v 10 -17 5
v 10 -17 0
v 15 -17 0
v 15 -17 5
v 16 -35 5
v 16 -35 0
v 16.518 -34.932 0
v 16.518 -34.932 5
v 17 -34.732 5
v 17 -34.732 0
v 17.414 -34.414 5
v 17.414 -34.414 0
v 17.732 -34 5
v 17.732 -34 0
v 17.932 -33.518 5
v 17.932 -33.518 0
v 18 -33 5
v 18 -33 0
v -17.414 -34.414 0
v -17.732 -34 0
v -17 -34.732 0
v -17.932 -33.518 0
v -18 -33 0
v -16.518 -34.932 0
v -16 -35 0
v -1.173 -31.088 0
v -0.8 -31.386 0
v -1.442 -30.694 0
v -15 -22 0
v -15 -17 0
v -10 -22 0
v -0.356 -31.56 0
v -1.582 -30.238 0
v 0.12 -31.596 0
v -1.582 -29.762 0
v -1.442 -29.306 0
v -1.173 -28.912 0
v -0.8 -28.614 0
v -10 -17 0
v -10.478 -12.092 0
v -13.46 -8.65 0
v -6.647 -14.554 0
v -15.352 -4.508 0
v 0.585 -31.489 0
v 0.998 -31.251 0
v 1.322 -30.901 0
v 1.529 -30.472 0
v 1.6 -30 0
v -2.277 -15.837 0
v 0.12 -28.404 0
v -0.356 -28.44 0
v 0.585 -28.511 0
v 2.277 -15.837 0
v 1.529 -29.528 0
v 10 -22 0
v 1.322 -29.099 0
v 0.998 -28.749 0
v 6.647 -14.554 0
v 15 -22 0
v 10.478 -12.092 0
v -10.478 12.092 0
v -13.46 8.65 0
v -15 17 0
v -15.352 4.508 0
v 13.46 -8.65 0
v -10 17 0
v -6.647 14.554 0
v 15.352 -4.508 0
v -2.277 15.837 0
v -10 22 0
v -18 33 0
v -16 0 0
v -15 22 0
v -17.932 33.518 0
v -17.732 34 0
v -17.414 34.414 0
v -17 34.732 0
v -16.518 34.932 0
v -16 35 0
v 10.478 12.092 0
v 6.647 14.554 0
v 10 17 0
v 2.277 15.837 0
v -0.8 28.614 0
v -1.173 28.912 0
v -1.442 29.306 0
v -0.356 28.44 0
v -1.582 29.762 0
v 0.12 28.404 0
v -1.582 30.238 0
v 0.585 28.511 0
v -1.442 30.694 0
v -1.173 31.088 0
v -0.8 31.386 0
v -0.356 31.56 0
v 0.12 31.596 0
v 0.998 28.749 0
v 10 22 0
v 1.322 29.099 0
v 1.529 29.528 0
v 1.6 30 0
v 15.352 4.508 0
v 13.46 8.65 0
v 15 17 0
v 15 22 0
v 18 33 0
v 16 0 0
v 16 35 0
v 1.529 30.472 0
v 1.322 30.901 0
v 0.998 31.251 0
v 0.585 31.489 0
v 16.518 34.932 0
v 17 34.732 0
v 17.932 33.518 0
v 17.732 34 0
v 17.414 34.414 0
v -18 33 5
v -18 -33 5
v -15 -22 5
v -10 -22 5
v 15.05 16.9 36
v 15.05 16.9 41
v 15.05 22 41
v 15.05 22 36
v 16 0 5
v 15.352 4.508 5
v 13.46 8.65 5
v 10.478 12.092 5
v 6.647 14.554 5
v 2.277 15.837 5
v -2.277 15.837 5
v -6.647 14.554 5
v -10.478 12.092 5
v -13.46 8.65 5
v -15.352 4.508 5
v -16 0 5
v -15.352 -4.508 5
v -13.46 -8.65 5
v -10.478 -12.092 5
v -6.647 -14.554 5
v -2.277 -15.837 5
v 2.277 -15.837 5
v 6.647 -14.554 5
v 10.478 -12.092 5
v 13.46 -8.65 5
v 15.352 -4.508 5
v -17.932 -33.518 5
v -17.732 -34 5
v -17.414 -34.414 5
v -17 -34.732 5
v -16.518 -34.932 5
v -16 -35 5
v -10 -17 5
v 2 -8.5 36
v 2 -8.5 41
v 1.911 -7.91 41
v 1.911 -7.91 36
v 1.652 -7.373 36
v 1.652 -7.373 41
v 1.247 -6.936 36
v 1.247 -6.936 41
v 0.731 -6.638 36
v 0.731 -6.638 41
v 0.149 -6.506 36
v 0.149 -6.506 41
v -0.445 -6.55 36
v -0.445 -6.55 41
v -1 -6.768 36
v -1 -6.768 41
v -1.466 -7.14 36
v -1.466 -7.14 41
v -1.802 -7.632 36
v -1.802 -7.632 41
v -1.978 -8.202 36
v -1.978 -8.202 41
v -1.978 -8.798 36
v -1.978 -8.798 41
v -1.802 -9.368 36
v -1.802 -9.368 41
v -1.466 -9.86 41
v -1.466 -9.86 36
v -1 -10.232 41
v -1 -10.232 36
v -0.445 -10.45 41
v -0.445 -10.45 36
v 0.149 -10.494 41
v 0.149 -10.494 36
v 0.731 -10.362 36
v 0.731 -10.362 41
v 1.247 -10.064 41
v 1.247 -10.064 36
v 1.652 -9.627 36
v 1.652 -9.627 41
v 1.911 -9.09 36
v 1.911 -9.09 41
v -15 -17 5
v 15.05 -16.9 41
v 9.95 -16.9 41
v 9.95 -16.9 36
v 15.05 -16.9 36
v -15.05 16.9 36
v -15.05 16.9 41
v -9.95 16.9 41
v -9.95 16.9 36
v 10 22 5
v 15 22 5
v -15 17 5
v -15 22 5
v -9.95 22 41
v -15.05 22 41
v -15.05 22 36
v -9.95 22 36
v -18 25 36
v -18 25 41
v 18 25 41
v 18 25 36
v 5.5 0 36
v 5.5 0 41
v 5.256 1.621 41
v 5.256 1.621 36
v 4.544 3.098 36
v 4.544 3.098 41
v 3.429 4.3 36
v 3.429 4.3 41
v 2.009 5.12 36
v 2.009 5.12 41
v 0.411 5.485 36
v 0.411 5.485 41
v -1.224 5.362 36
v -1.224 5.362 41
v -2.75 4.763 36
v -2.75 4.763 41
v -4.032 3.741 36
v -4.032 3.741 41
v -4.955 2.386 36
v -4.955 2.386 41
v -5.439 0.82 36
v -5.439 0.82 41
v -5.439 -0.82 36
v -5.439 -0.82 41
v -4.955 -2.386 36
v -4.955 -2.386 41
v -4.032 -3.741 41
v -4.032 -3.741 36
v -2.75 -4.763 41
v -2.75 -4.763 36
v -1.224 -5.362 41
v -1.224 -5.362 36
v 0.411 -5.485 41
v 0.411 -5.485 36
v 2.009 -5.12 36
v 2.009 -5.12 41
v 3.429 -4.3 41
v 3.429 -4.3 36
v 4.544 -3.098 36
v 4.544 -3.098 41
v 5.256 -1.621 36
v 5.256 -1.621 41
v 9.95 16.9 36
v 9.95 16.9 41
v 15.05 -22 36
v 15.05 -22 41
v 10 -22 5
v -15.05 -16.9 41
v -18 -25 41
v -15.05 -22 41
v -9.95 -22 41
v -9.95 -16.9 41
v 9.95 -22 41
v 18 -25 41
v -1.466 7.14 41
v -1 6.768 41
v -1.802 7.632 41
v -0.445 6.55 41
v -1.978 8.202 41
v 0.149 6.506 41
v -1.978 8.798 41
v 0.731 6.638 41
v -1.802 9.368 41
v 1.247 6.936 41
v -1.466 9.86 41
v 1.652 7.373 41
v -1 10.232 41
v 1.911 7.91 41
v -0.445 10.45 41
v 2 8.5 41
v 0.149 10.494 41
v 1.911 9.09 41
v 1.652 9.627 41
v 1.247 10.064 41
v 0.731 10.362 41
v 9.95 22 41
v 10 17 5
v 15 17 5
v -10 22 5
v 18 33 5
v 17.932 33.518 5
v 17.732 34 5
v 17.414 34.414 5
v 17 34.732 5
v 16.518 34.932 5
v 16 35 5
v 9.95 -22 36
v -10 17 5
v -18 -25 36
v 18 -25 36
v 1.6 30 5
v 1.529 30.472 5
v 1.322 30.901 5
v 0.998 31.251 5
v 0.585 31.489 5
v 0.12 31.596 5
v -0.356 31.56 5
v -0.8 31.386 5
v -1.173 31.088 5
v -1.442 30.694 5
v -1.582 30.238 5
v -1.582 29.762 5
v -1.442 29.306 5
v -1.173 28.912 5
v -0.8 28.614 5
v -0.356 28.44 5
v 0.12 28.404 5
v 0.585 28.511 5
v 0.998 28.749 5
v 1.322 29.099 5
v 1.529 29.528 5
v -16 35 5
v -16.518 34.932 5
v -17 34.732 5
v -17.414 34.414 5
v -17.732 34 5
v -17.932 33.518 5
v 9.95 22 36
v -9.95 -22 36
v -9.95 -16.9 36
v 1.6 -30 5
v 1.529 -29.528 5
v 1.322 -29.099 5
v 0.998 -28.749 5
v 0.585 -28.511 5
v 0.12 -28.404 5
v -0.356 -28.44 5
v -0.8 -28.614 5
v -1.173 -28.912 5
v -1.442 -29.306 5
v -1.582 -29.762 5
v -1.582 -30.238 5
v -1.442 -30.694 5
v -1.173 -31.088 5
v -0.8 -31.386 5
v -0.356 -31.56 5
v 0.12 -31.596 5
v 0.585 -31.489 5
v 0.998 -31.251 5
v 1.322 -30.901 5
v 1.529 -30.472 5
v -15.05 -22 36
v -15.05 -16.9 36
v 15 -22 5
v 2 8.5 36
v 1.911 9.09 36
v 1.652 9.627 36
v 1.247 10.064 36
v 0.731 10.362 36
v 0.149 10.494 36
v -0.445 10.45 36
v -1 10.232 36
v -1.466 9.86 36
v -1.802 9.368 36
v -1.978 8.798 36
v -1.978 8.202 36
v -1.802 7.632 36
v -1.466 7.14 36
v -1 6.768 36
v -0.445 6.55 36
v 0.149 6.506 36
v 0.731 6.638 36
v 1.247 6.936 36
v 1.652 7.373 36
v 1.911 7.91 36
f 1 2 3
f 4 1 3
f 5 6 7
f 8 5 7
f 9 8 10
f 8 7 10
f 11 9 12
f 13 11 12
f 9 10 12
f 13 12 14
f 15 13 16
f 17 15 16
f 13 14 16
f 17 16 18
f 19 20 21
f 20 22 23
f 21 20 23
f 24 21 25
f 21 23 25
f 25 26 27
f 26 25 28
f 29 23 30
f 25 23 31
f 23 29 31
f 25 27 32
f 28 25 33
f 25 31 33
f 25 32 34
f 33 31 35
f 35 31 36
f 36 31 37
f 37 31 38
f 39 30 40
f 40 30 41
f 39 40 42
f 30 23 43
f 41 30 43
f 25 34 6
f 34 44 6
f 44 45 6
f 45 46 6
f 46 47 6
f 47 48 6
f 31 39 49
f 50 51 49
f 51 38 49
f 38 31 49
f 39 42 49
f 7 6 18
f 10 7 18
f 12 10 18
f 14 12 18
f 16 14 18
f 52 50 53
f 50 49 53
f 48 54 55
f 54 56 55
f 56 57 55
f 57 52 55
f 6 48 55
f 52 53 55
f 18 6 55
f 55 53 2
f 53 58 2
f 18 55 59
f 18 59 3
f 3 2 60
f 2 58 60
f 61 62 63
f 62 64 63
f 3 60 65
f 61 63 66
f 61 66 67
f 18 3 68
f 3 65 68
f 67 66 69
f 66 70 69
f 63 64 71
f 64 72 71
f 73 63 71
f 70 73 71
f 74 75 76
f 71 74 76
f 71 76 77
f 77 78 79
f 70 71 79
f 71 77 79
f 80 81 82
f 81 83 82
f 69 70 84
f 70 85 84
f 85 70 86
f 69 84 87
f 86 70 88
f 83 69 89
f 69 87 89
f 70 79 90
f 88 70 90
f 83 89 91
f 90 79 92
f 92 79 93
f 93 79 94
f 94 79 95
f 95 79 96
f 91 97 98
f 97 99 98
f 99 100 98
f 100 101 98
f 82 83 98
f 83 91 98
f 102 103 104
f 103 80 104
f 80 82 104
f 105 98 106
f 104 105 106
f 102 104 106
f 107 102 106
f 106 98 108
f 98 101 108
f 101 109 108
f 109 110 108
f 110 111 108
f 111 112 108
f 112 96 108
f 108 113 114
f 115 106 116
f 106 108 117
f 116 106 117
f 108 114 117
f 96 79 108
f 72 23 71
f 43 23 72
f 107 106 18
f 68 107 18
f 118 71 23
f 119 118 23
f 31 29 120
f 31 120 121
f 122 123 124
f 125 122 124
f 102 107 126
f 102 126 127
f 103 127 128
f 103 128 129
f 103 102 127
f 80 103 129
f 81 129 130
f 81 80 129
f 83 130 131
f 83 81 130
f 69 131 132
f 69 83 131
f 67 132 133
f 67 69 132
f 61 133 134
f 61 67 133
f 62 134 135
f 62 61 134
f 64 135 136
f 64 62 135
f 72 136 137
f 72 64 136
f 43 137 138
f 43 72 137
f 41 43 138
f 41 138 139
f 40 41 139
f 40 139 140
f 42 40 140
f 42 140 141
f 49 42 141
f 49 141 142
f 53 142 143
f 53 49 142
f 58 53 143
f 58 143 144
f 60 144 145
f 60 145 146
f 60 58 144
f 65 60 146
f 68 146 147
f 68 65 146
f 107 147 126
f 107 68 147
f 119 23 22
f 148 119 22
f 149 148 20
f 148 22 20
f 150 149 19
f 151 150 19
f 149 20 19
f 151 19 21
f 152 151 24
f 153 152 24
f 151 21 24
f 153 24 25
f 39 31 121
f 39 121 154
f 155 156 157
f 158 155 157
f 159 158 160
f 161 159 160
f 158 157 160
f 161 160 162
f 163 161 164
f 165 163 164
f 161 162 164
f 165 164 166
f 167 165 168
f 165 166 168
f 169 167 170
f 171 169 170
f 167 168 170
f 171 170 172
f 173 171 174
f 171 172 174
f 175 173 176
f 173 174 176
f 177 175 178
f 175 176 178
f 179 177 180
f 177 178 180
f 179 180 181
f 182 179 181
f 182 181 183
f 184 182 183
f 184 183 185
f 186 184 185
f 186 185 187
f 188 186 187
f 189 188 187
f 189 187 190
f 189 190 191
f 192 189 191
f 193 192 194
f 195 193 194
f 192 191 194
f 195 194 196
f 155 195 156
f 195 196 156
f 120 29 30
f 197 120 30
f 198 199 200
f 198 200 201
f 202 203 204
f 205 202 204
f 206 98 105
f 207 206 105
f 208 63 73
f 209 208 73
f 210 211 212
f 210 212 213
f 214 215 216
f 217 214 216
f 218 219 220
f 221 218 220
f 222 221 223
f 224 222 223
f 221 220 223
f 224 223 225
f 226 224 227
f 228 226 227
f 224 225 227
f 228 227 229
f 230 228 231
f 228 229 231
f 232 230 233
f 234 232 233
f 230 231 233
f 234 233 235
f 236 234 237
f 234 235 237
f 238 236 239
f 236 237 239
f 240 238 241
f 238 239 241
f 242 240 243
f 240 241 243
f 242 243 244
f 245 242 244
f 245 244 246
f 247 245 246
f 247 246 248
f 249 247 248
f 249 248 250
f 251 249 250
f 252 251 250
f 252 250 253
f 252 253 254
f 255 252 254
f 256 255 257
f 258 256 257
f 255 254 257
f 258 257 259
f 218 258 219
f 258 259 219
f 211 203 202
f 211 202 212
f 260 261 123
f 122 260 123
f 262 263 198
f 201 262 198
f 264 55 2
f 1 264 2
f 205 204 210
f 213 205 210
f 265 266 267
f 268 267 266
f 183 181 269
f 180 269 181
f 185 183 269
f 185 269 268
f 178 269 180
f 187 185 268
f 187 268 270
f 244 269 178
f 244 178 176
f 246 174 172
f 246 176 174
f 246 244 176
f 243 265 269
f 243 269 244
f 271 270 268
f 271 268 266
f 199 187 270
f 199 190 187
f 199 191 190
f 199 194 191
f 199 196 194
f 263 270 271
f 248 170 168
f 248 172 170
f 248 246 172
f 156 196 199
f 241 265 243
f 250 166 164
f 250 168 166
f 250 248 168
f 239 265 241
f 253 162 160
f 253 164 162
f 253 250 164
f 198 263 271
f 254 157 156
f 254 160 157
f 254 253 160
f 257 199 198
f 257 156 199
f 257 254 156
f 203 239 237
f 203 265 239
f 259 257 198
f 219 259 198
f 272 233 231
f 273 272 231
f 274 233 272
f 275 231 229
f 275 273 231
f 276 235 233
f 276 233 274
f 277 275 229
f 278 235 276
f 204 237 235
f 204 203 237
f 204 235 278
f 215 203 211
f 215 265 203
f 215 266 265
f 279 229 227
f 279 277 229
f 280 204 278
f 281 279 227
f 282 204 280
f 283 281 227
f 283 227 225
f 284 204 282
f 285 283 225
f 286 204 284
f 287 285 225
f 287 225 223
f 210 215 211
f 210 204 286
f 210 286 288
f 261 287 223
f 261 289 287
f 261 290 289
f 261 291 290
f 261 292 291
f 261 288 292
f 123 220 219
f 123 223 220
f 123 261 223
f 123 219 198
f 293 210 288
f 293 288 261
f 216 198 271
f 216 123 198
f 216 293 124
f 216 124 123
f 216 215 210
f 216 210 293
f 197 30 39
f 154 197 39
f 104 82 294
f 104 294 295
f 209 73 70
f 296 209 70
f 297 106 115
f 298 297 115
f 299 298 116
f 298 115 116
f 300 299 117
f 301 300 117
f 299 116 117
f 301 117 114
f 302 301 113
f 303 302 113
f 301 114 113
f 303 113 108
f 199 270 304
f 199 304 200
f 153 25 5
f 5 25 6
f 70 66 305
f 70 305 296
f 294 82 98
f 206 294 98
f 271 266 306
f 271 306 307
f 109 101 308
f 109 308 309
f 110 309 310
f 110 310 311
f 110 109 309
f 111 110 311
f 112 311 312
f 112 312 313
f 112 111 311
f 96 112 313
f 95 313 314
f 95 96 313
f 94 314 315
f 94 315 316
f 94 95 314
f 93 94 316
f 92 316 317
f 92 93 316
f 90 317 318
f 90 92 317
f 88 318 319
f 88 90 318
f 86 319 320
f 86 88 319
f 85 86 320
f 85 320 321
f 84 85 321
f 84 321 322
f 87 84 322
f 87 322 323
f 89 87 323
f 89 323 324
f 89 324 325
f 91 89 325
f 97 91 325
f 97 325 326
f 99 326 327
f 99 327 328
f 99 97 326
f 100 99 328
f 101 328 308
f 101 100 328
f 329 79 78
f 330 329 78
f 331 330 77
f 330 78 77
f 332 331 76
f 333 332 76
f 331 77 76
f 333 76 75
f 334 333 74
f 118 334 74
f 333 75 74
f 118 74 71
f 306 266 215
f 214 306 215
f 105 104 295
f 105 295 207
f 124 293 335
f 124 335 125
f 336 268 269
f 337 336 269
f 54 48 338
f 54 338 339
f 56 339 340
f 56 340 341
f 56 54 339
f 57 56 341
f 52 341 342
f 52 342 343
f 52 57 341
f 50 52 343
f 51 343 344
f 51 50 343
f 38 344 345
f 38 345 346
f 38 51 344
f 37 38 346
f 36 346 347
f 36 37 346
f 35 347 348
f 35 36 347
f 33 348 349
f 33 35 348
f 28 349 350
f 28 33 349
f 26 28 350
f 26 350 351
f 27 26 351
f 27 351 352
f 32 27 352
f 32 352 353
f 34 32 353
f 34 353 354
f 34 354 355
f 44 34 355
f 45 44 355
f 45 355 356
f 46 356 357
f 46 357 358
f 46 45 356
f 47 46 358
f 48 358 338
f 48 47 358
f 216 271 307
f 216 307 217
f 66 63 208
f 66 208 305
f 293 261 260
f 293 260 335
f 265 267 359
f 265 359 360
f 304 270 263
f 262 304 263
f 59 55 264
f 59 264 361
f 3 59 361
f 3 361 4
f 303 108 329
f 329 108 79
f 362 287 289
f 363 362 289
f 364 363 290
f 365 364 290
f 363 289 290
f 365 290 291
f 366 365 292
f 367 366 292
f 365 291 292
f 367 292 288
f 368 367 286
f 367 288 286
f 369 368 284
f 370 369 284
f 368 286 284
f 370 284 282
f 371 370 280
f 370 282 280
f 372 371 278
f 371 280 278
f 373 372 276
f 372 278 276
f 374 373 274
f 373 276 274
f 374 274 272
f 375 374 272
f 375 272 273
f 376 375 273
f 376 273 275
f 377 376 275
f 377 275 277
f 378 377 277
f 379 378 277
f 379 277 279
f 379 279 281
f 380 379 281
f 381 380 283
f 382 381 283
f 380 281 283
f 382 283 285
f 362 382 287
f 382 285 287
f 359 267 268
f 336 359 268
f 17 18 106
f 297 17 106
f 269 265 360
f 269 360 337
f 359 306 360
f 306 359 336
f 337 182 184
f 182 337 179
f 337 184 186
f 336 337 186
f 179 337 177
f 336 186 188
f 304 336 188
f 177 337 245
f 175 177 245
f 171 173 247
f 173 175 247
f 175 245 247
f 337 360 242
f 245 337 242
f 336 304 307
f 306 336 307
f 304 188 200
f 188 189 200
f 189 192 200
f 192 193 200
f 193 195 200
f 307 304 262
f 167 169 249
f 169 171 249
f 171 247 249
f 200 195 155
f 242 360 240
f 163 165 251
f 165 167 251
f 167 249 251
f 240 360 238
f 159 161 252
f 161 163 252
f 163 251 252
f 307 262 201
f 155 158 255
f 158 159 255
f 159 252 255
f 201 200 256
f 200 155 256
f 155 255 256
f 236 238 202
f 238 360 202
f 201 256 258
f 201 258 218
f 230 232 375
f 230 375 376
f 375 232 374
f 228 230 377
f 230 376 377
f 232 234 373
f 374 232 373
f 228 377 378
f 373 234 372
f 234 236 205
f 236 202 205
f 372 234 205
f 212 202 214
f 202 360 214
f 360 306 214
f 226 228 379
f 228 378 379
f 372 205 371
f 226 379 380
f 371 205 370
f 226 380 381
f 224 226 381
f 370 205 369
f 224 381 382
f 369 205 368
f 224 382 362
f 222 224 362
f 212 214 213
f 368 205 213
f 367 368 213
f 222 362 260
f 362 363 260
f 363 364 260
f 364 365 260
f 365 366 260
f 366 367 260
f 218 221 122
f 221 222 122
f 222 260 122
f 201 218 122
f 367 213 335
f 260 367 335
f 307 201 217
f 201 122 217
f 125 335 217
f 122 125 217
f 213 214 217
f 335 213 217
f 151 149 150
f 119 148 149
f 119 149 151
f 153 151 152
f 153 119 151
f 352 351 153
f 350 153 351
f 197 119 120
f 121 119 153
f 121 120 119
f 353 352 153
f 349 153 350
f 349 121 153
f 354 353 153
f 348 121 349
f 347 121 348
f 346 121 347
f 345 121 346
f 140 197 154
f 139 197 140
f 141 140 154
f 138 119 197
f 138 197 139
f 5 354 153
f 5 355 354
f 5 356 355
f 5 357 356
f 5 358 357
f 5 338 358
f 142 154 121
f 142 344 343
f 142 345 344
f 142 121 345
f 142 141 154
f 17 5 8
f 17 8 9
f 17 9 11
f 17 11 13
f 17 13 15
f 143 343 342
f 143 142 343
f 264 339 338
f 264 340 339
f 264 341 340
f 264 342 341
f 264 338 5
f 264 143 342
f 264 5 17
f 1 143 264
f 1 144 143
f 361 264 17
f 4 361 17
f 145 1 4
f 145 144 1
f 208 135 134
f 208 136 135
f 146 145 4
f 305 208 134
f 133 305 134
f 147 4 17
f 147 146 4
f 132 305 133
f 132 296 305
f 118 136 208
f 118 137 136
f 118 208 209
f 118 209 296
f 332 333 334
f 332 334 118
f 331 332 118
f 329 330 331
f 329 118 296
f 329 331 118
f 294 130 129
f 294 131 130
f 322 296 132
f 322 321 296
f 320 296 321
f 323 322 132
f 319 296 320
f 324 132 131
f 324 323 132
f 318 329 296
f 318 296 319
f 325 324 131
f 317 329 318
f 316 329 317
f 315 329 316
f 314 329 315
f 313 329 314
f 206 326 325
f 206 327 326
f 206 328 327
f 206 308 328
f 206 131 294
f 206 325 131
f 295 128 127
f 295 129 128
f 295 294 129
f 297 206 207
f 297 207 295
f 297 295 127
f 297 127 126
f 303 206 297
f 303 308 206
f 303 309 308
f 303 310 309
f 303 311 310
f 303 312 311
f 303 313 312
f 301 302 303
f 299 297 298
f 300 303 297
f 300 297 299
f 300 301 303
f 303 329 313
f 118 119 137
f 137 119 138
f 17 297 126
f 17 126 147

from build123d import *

# Parameters (mm, degrees)
F0_W     = 5
F0_H     = 5
F0_R     = 1.6
F0_R_2   = 16
F3_DEPTH = 5
F2_W     = 36
F2_H     = 50
F2_W_2   = 5.1
F2_H_2   = 5.1
F2_R     = 2
F2_R_2   = 5.5
F4_DEPTH = 5


with BuildPart() as f3:
    # F0 (on Top) → F3 (new body)
    with BuildSketch(Plane.XY):
        with BuildLine():
            ThreePointArc((18, 33), (17.414214, 34.414214), (16, 35))
            Line((16, 35), (-16, 35))
            ThreePointArc((-16, 35), (-17.414214, 34.414214), (-18, 33))
            Line((-18, 33), (-18, -33))
            ThreePointArc((-18, -33), (-17.414214, -34.414214), (-16, -35))
            Line((-16, -35), (16, -35))
            ThreePointArc((16, -35), (17.414214, -34.414214), (18, -33))
            Line((18, -33), (18, 33))
        make_face()
        with Locations((-12.5, -19.5)):
            Rectangle(F0_W, F0_H, mode=Mode.SUBTRACT)
        with Locations((0, -30)):
            Circle(F0_R, mode=Mode.SUBTRACT)
        with Locations((12.5, -19.5)):
            Rectangle(F0_W, F0_H, mode=Mode.SUBTRACT)
        with Locations((-12.5, 19.5)):
            Rectangle(F0_W, F0_H, mode=Mode.SUBTRACT)
        Circle(F0_R_2, mode=Mode.SUBTRACT)
        with Locations((0, 30)):
            Circle(F0_R, mode=Mode.SUBTRACT)
        with Locations((12.5, 19.5)):
            Rectangle(F0_W, F0_H, mode=Mode.SUBTRACT)
    extrude(amount=F3_DEPTH)


with BuildPart() as f4:
    # F2 (on offset) → F4 (new body)
    with BuildSketch(Plane.XY.offset(41)):
        Rectangle(F2_W, F2_H)
        with Locations((-12.5, -19.45)):
            Rectangle(F2_W_2, F2_H_2, mode=Mode.SUBTRACT)
        with Locations((-12.5, 19.45)):
            Rectangle(F2_W_2, F2_H_2, mode=Mode.SUBTRACT)
        with Locations((12.5, -19.45)):
            Rectangle(F2_W_2, F2_H_2, mode=Mode.SUBTRACT)
        with Locations((0, -8.5)):
            Circle(F2_R, mode=Mode.SUBTRACT)
        Circle(F2_R_2, mode=Mode.SUBTRACT)
        with Locations((0, 8.5)):
            Circle(F2_R, mode=Mode.SUBTRACT)
        with Locations((12.5, 19.45)):
            Rectangle(F2_W_2, F2_H_2, mode=Mode.SUBTRACT)
    extrude(amount=-F4_DEPTH)


solid = Compound([f3.part, f4.part])
